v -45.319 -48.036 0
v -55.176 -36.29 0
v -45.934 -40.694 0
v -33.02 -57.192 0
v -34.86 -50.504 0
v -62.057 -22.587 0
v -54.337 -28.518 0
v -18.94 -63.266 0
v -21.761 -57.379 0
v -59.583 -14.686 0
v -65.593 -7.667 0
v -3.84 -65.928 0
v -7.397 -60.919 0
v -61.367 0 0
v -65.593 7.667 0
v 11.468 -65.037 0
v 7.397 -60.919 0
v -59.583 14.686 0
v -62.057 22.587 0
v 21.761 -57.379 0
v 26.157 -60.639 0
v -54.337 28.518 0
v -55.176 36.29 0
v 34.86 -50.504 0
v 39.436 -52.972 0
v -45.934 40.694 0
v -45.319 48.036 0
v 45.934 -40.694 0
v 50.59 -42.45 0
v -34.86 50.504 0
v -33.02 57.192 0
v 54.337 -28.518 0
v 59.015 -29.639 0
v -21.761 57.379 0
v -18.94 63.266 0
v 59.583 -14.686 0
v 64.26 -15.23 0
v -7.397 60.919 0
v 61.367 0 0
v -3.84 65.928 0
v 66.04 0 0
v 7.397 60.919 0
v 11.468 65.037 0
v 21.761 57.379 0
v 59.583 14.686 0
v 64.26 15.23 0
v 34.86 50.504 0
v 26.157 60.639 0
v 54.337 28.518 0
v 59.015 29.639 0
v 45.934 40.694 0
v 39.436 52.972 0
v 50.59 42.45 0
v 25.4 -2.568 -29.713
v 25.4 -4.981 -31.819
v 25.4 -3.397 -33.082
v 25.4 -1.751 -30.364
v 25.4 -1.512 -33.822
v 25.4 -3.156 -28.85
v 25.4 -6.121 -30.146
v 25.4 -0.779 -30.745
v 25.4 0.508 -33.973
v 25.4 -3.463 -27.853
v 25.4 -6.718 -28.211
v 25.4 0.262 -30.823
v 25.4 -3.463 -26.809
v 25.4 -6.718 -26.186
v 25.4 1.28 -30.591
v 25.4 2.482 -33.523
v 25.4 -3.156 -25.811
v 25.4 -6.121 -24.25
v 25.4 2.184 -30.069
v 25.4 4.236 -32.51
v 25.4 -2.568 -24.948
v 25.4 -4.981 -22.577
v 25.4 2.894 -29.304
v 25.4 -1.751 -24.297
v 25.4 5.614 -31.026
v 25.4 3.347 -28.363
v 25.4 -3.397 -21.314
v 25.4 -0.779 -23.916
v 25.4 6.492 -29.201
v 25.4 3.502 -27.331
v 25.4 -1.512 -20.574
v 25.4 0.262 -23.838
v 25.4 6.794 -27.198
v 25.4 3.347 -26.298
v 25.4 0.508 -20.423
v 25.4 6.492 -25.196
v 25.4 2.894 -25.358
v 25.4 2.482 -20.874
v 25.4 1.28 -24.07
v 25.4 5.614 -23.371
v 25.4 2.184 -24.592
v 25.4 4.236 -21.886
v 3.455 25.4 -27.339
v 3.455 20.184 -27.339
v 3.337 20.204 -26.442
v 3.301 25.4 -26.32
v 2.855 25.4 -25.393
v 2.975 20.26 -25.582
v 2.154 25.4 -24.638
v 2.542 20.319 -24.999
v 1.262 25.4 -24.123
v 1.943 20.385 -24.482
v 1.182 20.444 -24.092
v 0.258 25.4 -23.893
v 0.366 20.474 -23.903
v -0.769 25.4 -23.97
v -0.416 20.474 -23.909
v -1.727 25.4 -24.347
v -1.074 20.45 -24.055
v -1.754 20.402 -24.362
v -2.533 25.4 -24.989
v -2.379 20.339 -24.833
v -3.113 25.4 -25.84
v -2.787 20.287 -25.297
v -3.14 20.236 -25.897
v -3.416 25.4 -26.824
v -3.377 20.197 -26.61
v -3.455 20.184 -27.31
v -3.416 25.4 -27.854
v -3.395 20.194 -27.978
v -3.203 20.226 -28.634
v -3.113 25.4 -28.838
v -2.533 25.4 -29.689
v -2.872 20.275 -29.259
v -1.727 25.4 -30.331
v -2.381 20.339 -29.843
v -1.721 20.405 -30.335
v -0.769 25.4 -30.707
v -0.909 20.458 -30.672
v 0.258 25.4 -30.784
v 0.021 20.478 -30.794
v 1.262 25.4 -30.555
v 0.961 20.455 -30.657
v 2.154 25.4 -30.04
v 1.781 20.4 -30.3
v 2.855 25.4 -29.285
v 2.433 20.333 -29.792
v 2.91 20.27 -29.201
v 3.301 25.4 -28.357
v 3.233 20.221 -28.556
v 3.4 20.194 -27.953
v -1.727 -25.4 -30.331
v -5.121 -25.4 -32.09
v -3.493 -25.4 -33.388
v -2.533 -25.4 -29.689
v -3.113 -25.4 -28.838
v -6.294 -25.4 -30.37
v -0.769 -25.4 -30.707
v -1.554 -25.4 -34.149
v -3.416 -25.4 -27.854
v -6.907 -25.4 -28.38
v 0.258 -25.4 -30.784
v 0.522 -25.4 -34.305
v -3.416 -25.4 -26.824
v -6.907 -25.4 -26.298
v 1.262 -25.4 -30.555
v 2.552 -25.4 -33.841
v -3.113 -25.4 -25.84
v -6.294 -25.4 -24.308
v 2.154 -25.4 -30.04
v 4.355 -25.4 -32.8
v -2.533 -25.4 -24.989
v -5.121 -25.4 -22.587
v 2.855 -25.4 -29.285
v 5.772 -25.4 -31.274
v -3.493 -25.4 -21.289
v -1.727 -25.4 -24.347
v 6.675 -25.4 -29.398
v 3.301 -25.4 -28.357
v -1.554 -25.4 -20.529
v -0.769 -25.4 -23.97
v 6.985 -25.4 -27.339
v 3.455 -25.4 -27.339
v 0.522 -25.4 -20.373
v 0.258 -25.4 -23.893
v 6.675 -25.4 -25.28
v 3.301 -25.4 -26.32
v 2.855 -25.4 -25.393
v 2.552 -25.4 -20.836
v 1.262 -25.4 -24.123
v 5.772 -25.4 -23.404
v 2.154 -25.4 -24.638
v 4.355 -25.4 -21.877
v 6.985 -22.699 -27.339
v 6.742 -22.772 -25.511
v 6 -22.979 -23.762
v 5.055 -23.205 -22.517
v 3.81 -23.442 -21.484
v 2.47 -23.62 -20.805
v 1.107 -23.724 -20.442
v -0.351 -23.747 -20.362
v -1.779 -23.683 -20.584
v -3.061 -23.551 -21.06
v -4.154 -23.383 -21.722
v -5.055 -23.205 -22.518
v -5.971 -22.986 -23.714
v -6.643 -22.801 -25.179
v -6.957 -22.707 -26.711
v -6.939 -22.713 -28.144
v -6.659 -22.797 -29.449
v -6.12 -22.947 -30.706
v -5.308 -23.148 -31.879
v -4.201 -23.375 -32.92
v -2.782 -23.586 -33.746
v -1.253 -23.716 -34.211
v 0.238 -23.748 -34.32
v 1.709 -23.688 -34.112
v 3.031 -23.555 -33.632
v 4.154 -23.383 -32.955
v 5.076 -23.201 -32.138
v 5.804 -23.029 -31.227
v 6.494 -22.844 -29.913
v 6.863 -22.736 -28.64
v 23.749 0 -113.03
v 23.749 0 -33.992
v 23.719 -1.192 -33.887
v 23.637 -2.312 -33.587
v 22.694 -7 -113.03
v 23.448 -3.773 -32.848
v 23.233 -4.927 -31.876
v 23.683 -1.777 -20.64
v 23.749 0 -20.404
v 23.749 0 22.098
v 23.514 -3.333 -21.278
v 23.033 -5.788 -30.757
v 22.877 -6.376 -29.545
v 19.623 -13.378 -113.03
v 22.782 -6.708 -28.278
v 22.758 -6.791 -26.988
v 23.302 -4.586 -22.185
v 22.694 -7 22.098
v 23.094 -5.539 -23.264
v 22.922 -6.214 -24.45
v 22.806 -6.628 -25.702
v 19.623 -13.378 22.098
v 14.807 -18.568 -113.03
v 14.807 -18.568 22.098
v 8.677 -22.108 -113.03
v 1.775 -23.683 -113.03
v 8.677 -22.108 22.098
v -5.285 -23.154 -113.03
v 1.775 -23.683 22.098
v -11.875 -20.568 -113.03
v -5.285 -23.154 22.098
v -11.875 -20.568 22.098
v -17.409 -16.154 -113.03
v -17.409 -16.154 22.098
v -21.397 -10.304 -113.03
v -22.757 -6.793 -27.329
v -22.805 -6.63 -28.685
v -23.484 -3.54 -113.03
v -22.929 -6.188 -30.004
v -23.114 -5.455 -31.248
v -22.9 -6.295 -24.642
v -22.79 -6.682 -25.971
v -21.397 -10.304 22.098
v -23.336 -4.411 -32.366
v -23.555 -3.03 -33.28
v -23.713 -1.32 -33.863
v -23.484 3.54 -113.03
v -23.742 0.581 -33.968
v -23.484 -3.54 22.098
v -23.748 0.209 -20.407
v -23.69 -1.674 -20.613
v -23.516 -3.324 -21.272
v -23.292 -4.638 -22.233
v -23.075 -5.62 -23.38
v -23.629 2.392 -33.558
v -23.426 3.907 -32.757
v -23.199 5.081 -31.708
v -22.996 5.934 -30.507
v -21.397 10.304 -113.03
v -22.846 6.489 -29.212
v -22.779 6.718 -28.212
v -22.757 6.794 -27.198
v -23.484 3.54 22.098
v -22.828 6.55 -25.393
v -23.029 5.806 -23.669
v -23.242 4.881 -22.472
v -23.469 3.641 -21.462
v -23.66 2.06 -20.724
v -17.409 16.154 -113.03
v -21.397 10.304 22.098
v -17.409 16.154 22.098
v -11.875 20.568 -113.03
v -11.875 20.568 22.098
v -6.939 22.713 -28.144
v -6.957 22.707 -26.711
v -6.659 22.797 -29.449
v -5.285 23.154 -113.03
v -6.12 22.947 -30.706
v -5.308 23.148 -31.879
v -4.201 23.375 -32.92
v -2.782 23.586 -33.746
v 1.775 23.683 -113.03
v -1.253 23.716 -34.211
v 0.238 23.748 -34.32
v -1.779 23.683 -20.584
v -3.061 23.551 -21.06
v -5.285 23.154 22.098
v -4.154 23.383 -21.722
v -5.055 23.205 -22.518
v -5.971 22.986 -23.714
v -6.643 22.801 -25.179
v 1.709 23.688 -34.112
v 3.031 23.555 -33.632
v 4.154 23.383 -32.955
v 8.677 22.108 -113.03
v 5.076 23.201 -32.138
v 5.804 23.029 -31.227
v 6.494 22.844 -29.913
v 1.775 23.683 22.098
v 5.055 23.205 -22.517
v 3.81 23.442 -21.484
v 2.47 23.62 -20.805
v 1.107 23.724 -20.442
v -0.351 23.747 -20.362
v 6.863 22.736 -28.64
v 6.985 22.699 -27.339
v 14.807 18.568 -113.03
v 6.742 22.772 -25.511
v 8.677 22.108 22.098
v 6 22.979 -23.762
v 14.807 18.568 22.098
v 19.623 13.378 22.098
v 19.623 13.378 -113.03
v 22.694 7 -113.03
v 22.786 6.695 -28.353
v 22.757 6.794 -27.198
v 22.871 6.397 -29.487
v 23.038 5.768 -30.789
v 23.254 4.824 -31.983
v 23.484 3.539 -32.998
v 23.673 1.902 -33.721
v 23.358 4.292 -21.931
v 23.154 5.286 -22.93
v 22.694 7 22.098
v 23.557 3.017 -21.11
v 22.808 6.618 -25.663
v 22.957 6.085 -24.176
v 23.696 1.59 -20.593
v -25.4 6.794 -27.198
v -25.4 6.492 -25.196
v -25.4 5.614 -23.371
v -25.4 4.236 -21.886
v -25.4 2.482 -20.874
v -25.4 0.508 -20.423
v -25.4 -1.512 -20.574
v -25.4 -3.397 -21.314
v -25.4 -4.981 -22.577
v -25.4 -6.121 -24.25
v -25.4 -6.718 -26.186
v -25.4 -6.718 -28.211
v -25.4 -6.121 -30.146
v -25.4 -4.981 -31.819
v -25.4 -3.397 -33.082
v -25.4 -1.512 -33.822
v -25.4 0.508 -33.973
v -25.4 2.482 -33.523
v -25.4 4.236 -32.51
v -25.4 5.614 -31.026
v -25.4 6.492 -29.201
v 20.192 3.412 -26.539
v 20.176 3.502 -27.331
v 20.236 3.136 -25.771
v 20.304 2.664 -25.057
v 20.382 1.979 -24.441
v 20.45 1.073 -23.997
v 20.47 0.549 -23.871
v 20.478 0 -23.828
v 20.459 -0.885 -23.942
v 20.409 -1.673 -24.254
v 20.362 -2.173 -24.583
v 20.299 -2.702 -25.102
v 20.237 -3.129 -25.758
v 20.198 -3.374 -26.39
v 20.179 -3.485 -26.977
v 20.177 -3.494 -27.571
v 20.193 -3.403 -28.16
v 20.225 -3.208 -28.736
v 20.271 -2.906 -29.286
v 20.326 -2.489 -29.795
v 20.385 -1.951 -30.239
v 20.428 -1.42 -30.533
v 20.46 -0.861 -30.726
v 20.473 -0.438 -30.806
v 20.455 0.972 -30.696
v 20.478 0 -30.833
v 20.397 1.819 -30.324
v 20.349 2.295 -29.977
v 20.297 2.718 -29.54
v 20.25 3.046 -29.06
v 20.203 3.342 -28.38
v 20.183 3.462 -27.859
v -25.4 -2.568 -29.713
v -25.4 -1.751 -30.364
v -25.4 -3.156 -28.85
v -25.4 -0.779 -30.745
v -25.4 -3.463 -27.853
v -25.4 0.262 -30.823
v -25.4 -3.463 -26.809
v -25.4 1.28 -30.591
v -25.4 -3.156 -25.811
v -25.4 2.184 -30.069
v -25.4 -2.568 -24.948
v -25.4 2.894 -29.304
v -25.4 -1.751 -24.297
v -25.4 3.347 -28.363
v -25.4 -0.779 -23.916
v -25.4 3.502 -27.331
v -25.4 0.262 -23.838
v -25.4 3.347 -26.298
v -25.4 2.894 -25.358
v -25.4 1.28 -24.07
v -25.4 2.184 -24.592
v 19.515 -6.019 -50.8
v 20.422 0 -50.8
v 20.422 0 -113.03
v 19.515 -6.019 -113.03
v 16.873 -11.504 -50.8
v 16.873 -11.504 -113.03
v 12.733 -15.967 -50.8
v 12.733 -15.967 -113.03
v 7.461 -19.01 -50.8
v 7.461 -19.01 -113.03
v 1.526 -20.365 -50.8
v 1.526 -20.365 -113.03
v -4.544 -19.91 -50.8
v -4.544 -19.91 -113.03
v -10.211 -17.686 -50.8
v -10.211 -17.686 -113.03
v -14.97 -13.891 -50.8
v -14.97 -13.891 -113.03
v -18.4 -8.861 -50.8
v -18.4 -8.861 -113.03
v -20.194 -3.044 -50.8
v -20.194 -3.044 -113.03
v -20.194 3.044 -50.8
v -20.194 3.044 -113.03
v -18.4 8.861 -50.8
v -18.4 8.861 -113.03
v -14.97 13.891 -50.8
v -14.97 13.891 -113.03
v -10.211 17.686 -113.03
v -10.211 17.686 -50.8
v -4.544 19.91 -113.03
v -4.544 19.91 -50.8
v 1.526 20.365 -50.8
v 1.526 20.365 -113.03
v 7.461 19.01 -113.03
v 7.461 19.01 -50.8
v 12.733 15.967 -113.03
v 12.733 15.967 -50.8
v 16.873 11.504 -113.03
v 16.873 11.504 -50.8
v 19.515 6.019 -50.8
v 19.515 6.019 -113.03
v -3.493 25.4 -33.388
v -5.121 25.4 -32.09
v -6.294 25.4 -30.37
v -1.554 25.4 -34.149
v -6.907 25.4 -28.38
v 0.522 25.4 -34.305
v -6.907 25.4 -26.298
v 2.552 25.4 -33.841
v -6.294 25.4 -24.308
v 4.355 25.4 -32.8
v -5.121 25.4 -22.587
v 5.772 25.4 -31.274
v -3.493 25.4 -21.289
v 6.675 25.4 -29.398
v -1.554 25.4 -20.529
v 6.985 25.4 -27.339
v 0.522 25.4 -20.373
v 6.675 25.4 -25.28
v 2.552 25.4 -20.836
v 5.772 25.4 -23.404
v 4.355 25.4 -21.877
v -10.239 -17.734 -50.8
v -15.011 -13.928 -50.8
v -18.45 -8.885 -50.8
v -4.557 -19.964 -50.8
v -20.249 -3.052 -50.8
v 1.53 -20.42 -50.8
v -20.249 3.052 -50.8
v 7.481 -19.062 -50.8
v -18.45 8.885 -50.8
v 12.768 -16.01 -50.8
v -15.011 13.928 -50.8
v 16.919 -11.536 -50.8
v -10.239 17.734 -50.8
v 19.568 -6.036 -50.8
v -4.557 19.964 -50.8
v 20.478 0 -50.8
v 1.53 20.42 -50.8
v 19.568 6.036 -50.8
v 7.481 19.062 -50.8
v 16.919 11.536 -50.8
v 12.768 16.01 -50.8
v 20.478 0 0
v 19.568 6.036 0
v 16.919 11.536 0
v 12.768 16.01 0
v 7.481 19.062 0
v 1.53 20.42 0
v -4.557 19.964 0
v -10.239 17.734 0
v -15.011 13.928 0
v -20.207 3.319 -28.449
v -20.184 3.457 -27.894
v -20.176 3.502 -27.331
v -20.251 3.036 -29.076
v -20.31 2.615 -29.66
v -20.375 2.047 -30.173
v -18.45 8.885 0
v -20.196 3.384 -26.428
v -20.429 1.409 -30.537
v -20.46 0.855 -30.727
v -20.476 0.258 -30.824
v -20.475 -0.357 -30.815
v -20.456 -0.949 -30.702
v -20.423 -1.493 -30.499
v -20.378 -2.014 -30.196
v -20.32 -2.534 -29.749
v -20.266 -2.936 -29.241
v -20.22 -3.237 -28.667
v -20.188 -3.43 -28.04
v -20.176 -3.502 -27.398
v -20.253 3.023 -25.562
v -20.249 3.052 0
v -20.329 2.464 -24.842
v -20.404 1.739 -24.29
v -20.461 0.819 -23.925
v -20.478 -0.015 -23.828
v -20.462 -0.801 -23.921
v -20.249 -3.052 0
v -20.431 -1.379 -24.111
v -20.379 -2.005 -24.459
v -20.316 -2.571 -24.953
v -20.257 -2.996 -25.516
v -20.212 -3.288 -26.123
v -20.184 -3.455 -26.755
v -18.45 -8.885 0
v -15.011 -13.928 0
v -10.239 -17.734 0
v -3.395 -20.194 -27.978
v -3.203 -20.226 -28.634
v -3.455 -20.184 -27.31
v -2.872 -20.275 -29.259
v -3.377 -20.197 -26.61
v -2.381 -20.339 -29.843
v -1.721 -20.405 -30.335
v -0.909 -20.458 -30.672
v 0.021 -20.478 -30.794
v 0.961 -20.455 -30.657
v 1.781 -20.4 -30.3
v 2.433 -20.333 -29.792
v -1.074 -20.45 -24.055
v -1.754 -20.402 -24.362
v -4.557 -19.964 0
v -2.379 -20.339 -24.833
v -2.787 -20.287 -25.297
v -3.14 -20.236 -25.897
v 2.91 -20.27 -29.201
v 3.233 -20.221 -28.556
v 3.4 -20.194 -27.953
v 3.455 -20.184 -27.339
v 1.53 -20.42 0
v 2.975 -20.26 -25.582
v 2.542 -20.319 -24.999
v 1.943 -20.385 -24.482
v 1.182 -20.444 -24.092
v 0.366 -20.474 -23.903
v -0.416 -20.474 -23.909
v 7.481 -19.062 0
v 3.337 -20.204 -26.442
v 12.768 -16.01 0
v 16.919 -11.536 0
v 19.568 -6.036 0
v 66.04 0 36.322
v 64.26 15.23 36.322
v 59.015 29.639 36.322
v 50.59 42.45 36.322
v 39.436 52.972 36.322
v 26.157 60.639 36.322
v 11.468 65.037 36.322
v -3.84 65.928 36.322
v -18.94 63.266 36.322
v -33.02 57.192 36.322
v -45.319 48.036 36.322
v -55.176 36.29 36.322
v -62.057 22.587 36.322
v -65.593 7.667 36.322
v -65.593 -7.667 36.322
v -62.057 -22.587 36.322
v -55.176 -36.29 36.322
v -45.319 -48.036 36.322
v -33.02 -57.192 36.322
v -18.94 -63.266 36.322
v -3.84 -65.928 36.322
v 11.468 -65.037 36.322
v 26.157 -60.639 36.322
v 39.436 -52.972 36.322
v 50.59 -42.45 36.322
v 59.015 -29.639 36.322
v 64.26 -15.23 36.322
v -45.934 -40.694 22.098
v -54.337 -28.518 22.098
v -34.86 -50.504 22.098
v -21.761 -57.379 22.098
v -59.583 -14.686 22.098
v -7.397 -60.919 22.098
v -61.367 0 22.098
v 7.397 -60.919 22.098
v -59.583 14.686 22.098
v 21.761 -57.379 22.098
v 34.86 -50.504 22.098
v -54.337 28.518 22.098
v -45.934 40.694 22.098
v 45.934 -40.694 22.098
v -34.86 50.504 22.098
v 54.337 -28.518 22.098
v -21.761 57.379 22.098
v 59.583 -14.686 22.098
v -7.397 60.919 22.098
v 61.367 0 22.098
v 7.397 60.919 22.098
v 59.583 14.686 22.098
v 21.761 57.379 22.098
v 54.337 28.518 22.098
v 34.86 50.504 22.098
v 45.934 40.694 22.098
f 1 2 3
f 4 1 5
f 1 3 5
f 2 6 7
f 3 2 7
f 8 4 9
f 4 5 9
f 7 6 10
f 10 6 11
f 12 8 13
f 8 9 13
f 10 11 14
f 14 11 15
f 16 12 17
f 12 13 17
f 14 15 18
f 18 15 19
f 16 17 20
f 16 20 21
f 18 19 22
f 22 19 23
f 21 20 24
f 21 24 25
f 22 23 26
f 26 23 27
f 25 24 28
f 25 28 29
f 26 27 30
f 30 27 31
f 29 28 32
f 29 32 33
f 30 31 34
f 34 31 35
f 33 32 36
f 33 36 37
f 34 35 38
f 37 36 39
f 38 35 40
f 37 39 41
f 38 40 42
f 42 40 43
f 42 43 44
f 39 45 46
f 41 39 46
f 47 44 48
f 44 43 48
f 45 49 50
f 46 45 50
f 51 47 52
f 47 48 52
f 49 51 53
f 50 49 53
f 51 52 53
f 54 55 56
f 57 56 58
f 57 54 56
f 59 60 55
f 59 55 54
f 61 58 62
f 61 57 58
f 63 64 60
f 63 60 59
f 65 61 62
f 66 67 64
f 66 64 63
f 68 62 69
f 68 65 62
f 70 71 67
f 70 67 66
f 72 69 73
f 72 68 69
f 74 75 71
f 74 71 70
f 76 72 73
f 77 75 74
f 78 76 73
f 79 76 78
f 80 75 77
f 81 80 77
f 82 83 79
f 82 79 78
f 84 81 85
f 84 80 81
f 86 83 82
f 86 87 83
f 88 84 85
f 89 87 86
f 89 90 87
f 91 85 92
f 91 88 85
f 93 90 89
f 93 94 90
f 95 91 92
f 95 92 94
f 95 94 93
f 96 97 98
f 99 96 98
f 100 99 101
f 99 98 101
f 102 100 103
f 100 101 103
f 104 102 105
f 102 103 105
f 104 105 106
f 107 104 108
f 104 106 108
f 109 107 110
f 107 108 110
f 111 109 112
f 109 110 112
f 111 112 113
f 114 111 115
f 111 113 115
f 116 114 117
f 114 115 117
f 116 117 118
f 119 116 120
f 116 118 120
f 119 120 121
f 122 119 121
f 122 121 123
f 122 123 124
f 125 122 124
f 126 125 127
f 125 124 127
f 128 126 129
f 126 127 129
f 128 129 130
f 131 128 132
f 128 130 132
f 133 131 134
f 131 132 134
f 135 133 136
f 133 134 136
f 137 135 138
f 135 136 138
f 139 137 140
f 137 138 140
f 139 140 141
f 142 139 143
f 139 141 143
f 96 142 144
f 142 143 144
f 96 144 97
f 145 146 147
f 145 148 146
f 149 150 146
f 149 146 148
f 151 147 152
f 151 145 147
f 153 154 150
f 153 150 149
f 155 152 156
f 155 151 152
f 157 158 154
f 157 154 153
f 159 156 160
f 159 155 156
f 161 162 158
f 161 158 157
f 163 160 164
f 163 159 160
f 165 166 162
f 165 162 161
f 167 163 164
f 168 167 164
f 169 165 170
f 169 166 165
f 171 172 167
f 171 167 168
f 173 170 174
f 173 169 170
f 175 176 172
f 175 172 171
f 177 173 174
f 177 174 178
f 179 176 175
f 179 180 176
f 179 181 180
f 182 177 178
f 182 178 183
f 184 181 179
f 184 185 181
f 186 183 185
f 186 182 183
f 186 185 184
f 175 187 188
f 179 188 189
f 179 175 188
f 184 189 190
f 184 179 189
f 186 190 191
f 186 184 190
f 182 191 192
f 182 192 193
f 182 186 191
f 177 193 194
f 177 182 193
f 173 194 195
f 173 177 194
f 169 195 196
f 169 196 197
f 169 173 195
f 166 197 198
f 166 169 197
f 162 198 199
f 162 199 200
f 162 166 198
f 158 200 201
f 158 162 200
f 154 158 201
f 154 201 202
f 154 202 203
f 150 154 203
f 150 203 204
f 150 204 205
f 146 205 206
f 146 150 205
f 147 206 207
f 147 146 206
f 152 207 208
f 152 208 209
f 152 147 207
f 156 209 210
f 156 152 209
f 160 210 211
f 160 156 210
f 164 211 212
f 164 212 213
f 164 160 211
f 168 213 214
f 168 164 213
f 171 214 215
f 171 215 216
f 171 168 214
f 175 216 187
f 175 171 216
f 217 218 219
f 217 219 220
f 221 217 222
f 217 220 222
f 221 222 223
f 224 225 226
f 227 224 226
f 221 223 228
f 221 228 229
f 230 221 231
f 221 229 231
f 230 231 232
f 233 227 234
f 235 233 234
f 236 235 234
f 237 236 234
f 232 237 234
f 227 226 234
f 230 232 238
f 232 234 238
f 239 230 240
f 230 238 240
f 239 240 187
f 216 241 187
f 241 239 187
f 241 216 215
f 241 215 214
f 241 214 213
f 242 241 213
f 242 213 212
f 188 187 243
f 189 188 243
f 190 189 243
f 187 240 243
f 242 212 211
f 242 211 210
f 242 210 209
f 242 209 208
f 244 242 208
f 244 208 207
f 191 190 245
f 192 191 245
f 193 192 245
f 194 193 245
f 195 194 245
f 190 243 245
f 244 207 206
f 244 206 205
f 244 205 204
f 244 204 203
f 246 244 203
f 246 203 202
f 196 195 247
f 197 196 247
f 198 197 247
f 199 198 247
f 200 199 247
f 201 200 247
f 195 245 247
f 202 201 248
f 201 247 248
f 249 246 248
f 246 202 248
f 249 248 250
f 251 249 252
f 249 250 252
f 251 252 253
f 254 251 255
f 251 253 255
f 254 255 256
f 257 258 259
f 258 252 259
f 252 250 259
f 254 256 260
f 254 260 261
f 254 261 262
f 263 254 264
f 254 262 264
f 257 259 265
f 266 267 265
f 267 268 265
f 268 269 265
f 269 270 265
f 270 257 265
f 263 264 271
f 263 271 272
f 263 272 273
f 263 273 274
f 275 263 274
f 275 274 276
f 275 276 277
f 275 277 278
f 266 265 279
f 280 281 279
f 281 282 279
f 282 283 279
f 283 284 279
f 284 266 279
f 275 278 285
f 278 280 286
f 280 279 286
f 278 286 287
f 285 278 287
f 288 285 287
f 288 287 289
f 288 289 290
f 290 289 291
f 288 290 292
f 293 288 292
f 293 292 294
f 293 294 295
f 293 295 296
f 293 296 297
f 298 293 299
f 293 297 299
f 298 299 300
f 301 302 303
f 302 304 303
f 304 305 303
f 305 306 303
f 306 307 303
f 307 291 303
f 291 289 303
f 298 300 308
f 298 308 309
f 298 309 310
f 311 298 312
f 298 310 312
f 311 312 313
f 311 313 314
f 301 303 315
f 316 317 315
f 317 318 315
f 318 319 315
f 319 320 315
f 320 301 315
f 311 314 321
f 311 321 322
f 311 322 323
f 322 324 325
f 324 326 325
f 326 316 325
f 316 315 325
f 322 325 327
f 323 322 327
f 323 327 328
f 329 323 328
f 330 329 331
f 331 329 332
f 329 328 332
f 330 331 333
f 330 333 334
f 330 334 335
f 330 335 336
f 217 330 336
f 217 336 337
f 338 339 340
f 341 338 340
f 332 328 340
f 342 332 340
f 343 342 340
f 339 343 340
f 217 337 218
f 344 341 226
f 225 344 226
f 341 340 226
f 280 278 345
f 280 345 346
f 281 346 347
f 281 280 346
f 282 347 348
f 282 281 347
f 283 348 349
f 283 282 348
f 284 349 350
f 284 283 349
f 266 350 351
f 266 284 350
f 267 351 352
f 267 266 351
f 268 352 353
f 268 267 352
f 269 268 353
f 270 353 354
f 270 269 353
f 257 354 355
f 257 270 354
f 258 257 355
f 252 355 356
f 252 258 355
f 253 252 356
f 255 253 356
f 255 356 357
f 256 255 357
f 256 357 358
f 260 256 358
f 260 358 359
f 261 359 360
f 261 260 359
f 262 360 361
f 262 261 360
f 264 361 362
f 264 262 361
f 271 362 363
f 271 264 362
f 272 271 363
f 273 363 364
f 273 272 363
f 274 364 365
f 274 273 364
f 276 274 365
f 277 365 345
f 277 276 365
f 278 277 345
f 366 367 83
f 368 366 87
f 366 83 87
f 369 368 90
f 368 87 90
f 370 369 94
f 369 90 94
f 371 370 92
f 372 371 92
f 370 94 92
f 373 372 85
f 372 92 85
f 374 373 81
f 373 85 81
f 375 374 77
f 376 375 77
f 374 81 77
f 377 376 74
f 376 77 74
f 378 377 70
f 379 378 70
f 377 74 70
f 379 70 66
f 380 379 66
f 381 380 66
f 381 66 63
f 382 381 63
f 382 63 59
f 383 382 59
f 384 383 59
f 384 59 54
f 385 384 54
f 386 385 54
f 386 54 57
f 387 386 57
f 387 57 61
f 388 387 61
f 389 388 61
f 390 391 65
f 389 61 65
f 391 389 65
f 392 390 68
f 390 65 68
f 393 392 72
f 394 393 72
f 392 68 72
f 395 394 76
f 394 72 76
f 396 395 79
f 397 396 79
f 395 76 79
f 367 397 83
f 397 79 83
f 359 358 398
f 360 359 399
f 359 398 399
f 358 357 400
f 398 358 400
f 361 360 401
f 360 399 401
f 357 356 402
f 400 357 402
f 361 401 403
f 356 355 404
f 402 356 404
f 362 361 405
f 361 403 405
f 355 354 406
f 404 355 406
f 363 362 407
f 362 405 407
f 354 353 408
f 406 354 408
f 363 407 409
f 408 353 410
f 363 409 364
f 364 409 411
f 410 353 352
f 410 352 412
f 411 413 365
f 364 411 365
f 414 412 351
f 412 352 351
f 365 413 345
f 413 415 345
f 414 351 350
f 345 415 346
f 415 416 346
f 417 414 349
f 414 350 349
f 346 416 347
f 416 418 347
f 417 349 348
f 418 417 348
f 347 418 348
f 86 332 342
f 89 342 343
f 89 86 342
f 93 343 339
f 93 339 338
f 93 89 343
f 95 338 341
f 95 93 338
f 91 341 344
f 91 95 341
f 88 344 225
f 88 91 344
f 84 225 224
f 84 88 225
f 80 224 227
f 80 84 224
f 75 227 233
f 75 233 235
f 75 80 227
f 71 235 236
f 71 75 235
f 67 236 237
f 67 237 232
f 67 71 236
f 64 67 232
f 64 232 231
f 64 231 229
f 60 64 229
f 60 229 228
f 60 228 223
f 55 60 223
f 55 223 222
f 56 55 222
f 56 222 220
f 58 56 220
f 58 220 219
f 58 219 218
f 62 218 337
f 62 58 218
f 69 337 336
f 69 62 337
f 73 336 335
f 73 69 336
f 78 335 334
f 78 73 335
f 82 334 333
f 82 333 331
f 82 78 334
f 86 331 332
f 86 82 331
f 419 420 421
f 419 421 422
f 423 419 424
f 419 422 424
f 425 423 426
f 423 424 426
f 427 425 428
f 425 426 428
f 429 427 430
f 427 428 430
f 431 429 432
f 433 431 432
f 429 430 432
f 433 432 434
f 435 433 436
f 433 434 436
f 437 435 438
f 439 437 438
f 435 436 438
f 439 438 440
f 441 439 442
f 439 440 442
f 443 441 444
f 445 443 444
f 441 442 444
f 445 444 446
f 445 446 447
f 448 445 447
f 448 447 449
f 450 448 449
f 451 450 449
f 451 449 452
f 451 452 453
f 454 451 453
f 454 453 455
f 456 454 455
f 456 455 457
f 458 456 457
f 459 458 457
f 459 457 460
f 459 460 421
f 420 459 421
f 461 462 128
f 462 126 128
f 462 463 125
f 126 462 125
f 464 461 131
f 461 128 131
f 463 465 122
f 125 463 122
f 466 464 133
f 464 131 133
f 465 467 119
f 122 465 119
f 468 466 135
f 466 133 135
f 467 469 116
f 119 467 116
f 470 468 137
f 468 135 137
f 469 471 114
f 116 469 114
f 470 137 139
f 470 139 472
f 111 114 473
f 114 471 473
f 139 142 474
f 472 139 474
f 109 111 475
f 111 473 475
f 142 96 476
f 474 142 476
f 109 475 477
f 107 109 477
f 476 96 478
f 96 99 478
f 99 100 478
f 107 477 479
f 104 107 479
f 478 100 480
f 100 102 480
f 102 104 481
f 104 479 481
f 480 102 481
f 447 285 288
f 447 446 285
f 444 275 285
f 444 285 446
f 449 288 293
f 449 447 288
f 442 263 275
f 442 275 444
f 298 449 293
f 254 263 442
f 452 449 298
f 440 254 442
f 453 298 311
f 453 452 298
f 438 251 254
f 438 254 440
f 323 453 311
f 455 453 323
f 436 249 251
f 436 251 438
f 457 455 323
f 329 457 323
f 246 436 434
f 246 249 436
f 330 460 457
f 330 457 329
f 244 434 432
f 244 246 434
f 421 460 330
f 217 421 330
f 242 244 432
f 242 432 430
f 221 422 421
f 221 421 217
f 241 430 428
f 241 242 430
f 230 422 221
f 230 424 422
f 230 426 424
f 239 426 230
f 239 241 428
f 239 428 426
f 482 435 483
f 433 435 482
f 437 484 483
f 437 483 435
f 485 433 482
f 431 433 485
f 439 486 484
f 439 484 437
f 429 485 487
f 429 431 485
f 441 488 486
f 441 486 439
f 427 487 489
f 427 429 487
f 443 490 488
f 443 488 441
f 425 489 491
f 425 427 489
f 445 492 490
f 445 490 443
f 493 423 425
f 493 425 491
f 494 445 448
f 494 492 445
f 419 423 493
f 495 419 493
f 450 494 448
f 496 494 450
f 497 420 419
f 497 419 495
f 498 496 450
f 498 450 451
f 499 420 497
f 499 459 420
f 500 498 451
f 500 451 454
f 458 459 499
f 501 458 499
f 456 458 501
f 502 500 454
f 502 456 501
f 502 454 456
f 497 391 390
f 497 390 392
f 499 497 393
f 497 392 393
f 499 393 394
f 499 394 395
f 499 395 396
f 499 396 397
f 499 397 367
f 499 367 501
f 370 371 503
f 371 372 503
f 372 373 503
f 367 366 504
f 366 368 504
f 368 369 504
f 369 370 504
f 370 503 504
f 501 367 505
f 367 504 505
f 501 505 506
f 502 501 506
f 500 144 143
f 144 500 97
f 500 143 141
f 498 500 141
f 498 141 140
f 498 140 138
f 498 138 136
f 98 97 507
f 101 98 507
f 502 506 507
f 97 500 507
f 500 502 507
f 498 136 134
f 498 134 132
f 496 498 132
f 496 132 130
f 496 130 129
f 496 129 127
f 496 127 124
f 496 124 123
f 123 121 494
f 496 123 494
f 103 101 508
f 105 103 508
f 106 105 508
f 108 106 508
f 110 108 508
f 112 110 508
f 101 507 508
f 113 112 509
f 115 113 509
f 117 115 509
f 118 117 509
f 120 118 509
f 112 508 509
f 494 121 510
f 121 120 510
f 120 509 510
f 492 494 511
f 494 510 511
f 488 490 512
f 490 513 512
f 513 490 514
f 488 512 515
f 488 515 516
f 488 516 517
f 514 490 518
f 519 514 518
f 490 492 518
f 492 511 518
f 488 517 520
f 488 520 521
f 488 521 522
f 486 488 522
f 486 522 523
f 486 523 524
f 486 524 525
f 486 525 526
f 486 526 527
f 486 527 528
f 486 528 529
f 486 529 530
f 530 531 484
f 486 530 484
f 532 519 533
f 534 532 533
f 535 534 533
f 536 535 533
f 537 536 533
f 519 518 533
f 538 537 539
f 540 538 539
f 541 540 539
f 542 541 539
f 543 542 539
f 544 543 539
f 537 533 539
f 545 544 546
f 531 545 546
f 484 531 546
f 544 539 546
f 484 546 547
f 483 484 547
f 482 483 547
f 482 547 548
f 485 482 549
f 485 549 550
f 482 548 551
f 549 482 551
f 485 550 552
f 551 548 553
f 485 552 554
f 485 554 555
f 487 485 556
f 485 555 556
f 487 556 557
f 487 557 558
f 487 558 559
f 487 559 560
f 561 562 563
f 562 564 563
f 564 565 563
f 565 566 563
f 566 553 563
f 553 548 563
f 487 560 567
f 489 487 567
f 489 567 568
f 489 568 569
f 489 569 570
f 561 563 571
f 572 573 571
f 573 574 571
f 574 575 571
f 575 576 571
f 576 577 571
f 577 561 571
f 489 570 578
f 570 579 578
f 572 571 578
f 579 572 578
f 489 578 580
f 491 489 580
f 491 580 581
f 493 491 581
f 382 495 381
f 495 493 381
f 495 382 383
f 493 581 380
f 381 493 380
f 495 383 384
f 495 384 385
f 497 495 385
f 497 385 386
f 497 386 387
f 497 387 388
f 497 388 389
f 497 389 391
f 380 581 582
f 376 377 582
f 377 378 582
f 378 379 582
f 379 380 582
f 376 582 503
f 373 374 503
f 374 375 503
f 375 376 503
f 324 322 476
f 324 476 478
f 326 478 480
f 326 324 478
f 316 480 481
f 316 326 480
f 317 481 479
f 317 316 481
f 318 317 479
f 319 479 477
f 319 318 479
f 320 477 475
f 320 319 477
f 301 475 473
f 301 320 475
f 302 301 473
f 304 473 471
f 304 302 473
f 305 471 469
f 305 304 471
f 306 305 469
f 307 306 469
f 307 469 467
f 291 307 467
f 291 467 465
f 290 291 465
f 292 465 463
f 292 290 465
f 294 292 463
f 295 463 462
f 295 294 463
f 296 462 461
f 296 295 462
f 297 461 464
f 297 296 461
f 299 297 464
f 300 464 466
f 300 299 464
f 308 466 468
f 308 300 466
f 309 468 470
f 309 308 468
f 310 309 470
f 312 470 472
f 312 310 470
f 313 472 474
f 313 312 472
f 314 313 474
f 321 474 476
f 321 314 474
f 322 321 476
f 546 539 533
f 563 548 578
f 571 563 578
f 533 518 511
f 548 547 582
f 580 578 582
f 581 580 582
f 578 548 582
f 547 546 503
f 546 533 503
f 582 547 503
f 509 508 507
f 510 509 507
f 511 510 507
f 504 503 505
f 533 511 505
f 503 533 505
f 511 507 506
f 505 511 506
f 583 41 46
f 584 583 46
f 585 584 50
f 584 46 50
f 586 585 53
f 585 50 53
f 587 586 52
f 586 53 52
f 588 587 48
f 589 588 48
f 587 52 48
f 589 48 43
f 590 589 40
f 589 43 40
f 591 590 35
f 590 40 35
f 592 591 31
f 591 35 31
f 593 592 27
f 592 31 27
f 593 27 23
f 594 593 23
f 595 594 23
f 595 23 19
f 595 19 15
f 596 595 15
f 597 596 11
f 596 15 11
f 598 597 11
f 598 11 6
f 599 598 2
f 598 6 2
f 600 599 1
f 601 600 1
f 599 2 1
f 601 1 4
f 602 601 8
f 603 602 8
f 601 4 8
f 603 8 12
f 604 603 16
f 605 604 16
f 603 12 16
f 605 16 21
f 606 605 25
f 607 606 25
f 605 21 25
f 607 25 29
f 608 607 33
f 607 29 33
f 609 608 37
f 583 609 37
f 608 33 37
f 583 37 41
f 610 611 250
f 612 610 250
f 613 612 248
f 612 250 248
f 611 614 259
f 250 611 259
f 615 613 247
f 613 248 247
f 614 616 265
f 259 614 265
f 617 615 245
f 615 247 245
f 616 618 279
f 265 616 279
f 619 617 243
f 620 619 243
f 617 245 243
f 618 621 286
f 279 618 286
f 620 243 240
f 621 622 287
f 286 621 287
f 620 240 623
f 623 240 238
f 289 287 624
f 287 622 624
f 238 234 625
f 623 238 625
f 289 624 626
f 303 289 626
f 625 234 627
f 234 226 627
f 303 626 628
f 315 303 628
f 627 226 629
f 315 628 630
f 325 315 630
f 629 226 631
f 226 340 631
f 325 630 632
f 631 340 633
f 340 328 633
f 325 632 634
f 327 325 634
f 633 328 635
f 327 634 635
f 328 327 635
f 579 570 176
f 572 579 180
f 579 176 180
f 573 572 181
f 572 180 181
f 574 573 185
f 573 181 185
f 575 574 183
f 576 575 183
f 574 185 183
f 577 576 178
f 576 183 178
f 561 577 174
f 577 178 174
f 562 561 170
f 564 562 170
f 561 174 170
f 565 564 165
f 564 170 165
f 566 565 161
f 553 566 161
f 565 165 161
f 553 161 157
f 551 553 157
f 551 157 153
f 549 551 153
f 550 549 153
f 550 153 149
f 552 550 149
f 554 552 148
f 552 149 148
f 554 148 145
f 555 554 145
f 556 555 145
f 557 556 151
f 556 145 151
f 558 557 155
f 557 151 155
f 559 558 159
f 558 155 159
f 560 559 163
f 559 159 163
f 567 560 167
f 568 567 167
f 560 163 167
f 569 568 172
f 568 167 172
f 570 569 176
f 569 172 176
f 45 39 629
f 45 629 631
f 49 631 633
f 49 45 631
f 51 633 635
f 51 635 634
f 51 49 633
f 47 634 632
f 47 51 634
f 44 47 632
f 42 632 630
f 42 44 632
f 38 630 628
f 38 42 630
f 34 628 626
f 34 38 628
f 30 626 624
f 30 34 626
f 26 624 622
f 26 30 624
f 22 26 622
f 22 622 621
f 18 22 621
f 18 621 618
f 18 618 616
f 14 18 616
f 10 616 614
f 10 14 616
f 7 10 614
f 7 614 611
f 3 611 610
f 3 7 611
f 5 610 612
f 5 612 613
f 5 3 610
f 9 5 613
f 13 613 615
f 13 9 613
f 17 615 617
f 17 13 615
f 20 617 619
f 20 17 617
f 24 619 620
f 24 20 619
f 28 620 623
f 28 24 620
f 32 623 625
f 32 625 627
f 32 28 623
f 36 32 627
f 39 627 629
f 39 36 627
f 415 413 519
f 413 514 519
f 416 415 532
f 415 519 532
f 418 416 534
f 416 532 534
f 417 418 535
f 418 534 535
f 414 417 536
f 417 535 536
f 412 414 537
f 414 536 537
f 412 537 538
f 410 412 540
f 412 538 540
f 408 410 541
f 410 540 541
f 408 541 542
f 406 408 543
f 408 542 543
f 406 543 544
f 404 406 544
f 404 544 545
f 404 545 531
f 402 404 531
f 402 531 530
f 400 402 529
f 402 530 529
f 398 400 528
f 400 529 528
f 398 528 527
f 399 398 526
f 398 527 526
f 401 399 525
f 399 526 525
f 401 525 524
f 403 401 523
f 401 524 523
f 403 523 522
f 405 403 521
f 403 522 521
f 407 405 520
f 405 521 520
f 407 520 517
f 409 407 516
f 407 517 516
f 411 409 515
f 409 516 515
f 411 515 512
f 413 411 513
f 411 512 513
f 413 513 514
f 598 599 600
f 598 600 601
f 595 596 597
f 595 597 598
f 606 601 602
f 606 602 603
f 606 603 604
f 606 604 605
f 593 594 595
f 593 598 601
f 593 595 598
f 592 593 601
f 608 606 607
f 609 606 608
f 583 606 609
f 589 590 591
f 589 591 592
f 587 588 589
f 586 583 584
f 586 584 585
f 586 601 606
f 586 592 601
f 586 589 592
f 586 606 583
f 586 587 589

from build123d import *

# Parameters (mm, degrees)
F0_R       = 66.04
F1_DEPTH   = 36.322
F2_R       = 61.366529
F3_DEPTH   = 22.098
F4_R       = 23.749331
F5_DEPTH   = 23.622
F5_FACE_R  = 23.749331
F6_DEPTH   = 113.03
F7_R       = 20.42203
F8_DEPTH   = 101.6
F9_R       = 4.958863
F10_DEPTH  = 12.7
F10_FACE_R = 4.958863
F11_DEPTH  = 10.147979
F13_R      = 6.98539
F14_DEPTH  = 25.4
F15_R      = 6.794263
F16_DEPTH  = 25.4
F17_R      = 3.502484
F18_DEPTH  = 40.0812
F19_R      = 3.454969
F20_DEPTH  = 72.136
F21_R      = 20.477735
F22_DEPTH  = 50.8


with BuildPart() as f1:
    # F0 (on Top) → F1 (new body)
    with BuildSketch(Plane.XY):
        Circle(F0_R)
    extrude(amount=F1_DEPTH)

    # F2 (on Top) → F3 (cut)
    with BuildSketch(Plane.XY):
        Circle(F2_R)
    extrude(amount=F3_DEPTH, mode=Mode.SUBTRACT)

    # F4 (on Top) → F5 (join)
    with BuildSketch(Plane.XY):
        Circle(F4_R)
    extrude(amount=F5_DEPTH)

    # F5_face (on face) → F6 (join)
    with BuildSketch(Plane(origin=(0, 0, 0), x_dir=(1, 0, 0), z_dir=(0, 0, -1))):
        Circle(F5_FACE_R)
    extrude(amount=F6_DEPTH)

    # F7 (on face) → F8 (cut)
    with BuildSketch(Plane(origin=(0, 0, -113.03), x_dir=(1, 0, 0), z_dir=(0, 0, -1))):
        Circle(F7_R)
    extrude(amount=-F8_DEPTH, mode=Mode.SUBTRACT)

    # F13 (on Front) → F14 (join, symmetric)
    with BuildSketch(Plane.XZ):
        with Locations((0, -27.338758)):
            Circle(F13_R)
    extrude(amount=F14_DEPTH, both=True)

    # F15 (on Right) → F16 (join, symmetric)
    with BuildSketch(Plane.YZ):
        with Locations((0, -27.19821)):
            Circle(F15_R)
    extrude(amount=F16_DEPTH, both=True)

    # F17 (on Right) → F18 (cut, symmetric)
    with BuildSketch(Plane.YZ):
        with Locations((0, -27.330657)):
            Circle(F17_R)
    extrude(amount=F18_DEPTH, both=True, mode=Mode.SUBTRACT)

    # F19 (on face) → F20 (cut, symmetric)
    with BuildSketch(Plane.XZ.offset(25.4)):
        with Locations((0, -27.338758)):
            Circle(F19_R)
    extrude(amount=F20_DEPTH, both=True, mode=Mode.SUBTRACT)

    # F21 (on Top) → F22 (cut)
    with BuildSketch(Plane.XY):
        Circle(F21_R)
    extrude(amount=-F22_DEPTH, mode=Mode.SUBTRACT)


with BuildPart() as f10:
    # F9 (on Front) → F10 (new body)
    with BuildSketch(Plane.XZ):
        with Locations((0, -18.813234)):
            Circle(F9_R)
    extrude(amount=F10_DEPTH)

    # F10_face (on face) → F11 (join)
    with BuildSketch(Plane(origin=(0, 0, -18.813234), x_dir=(1, 0, 0), z_dir=(0, 1, 0))):
        Circle(F10_FACE_R)
    extrude(amount=F11_DEPTH)


solid = f1.part
